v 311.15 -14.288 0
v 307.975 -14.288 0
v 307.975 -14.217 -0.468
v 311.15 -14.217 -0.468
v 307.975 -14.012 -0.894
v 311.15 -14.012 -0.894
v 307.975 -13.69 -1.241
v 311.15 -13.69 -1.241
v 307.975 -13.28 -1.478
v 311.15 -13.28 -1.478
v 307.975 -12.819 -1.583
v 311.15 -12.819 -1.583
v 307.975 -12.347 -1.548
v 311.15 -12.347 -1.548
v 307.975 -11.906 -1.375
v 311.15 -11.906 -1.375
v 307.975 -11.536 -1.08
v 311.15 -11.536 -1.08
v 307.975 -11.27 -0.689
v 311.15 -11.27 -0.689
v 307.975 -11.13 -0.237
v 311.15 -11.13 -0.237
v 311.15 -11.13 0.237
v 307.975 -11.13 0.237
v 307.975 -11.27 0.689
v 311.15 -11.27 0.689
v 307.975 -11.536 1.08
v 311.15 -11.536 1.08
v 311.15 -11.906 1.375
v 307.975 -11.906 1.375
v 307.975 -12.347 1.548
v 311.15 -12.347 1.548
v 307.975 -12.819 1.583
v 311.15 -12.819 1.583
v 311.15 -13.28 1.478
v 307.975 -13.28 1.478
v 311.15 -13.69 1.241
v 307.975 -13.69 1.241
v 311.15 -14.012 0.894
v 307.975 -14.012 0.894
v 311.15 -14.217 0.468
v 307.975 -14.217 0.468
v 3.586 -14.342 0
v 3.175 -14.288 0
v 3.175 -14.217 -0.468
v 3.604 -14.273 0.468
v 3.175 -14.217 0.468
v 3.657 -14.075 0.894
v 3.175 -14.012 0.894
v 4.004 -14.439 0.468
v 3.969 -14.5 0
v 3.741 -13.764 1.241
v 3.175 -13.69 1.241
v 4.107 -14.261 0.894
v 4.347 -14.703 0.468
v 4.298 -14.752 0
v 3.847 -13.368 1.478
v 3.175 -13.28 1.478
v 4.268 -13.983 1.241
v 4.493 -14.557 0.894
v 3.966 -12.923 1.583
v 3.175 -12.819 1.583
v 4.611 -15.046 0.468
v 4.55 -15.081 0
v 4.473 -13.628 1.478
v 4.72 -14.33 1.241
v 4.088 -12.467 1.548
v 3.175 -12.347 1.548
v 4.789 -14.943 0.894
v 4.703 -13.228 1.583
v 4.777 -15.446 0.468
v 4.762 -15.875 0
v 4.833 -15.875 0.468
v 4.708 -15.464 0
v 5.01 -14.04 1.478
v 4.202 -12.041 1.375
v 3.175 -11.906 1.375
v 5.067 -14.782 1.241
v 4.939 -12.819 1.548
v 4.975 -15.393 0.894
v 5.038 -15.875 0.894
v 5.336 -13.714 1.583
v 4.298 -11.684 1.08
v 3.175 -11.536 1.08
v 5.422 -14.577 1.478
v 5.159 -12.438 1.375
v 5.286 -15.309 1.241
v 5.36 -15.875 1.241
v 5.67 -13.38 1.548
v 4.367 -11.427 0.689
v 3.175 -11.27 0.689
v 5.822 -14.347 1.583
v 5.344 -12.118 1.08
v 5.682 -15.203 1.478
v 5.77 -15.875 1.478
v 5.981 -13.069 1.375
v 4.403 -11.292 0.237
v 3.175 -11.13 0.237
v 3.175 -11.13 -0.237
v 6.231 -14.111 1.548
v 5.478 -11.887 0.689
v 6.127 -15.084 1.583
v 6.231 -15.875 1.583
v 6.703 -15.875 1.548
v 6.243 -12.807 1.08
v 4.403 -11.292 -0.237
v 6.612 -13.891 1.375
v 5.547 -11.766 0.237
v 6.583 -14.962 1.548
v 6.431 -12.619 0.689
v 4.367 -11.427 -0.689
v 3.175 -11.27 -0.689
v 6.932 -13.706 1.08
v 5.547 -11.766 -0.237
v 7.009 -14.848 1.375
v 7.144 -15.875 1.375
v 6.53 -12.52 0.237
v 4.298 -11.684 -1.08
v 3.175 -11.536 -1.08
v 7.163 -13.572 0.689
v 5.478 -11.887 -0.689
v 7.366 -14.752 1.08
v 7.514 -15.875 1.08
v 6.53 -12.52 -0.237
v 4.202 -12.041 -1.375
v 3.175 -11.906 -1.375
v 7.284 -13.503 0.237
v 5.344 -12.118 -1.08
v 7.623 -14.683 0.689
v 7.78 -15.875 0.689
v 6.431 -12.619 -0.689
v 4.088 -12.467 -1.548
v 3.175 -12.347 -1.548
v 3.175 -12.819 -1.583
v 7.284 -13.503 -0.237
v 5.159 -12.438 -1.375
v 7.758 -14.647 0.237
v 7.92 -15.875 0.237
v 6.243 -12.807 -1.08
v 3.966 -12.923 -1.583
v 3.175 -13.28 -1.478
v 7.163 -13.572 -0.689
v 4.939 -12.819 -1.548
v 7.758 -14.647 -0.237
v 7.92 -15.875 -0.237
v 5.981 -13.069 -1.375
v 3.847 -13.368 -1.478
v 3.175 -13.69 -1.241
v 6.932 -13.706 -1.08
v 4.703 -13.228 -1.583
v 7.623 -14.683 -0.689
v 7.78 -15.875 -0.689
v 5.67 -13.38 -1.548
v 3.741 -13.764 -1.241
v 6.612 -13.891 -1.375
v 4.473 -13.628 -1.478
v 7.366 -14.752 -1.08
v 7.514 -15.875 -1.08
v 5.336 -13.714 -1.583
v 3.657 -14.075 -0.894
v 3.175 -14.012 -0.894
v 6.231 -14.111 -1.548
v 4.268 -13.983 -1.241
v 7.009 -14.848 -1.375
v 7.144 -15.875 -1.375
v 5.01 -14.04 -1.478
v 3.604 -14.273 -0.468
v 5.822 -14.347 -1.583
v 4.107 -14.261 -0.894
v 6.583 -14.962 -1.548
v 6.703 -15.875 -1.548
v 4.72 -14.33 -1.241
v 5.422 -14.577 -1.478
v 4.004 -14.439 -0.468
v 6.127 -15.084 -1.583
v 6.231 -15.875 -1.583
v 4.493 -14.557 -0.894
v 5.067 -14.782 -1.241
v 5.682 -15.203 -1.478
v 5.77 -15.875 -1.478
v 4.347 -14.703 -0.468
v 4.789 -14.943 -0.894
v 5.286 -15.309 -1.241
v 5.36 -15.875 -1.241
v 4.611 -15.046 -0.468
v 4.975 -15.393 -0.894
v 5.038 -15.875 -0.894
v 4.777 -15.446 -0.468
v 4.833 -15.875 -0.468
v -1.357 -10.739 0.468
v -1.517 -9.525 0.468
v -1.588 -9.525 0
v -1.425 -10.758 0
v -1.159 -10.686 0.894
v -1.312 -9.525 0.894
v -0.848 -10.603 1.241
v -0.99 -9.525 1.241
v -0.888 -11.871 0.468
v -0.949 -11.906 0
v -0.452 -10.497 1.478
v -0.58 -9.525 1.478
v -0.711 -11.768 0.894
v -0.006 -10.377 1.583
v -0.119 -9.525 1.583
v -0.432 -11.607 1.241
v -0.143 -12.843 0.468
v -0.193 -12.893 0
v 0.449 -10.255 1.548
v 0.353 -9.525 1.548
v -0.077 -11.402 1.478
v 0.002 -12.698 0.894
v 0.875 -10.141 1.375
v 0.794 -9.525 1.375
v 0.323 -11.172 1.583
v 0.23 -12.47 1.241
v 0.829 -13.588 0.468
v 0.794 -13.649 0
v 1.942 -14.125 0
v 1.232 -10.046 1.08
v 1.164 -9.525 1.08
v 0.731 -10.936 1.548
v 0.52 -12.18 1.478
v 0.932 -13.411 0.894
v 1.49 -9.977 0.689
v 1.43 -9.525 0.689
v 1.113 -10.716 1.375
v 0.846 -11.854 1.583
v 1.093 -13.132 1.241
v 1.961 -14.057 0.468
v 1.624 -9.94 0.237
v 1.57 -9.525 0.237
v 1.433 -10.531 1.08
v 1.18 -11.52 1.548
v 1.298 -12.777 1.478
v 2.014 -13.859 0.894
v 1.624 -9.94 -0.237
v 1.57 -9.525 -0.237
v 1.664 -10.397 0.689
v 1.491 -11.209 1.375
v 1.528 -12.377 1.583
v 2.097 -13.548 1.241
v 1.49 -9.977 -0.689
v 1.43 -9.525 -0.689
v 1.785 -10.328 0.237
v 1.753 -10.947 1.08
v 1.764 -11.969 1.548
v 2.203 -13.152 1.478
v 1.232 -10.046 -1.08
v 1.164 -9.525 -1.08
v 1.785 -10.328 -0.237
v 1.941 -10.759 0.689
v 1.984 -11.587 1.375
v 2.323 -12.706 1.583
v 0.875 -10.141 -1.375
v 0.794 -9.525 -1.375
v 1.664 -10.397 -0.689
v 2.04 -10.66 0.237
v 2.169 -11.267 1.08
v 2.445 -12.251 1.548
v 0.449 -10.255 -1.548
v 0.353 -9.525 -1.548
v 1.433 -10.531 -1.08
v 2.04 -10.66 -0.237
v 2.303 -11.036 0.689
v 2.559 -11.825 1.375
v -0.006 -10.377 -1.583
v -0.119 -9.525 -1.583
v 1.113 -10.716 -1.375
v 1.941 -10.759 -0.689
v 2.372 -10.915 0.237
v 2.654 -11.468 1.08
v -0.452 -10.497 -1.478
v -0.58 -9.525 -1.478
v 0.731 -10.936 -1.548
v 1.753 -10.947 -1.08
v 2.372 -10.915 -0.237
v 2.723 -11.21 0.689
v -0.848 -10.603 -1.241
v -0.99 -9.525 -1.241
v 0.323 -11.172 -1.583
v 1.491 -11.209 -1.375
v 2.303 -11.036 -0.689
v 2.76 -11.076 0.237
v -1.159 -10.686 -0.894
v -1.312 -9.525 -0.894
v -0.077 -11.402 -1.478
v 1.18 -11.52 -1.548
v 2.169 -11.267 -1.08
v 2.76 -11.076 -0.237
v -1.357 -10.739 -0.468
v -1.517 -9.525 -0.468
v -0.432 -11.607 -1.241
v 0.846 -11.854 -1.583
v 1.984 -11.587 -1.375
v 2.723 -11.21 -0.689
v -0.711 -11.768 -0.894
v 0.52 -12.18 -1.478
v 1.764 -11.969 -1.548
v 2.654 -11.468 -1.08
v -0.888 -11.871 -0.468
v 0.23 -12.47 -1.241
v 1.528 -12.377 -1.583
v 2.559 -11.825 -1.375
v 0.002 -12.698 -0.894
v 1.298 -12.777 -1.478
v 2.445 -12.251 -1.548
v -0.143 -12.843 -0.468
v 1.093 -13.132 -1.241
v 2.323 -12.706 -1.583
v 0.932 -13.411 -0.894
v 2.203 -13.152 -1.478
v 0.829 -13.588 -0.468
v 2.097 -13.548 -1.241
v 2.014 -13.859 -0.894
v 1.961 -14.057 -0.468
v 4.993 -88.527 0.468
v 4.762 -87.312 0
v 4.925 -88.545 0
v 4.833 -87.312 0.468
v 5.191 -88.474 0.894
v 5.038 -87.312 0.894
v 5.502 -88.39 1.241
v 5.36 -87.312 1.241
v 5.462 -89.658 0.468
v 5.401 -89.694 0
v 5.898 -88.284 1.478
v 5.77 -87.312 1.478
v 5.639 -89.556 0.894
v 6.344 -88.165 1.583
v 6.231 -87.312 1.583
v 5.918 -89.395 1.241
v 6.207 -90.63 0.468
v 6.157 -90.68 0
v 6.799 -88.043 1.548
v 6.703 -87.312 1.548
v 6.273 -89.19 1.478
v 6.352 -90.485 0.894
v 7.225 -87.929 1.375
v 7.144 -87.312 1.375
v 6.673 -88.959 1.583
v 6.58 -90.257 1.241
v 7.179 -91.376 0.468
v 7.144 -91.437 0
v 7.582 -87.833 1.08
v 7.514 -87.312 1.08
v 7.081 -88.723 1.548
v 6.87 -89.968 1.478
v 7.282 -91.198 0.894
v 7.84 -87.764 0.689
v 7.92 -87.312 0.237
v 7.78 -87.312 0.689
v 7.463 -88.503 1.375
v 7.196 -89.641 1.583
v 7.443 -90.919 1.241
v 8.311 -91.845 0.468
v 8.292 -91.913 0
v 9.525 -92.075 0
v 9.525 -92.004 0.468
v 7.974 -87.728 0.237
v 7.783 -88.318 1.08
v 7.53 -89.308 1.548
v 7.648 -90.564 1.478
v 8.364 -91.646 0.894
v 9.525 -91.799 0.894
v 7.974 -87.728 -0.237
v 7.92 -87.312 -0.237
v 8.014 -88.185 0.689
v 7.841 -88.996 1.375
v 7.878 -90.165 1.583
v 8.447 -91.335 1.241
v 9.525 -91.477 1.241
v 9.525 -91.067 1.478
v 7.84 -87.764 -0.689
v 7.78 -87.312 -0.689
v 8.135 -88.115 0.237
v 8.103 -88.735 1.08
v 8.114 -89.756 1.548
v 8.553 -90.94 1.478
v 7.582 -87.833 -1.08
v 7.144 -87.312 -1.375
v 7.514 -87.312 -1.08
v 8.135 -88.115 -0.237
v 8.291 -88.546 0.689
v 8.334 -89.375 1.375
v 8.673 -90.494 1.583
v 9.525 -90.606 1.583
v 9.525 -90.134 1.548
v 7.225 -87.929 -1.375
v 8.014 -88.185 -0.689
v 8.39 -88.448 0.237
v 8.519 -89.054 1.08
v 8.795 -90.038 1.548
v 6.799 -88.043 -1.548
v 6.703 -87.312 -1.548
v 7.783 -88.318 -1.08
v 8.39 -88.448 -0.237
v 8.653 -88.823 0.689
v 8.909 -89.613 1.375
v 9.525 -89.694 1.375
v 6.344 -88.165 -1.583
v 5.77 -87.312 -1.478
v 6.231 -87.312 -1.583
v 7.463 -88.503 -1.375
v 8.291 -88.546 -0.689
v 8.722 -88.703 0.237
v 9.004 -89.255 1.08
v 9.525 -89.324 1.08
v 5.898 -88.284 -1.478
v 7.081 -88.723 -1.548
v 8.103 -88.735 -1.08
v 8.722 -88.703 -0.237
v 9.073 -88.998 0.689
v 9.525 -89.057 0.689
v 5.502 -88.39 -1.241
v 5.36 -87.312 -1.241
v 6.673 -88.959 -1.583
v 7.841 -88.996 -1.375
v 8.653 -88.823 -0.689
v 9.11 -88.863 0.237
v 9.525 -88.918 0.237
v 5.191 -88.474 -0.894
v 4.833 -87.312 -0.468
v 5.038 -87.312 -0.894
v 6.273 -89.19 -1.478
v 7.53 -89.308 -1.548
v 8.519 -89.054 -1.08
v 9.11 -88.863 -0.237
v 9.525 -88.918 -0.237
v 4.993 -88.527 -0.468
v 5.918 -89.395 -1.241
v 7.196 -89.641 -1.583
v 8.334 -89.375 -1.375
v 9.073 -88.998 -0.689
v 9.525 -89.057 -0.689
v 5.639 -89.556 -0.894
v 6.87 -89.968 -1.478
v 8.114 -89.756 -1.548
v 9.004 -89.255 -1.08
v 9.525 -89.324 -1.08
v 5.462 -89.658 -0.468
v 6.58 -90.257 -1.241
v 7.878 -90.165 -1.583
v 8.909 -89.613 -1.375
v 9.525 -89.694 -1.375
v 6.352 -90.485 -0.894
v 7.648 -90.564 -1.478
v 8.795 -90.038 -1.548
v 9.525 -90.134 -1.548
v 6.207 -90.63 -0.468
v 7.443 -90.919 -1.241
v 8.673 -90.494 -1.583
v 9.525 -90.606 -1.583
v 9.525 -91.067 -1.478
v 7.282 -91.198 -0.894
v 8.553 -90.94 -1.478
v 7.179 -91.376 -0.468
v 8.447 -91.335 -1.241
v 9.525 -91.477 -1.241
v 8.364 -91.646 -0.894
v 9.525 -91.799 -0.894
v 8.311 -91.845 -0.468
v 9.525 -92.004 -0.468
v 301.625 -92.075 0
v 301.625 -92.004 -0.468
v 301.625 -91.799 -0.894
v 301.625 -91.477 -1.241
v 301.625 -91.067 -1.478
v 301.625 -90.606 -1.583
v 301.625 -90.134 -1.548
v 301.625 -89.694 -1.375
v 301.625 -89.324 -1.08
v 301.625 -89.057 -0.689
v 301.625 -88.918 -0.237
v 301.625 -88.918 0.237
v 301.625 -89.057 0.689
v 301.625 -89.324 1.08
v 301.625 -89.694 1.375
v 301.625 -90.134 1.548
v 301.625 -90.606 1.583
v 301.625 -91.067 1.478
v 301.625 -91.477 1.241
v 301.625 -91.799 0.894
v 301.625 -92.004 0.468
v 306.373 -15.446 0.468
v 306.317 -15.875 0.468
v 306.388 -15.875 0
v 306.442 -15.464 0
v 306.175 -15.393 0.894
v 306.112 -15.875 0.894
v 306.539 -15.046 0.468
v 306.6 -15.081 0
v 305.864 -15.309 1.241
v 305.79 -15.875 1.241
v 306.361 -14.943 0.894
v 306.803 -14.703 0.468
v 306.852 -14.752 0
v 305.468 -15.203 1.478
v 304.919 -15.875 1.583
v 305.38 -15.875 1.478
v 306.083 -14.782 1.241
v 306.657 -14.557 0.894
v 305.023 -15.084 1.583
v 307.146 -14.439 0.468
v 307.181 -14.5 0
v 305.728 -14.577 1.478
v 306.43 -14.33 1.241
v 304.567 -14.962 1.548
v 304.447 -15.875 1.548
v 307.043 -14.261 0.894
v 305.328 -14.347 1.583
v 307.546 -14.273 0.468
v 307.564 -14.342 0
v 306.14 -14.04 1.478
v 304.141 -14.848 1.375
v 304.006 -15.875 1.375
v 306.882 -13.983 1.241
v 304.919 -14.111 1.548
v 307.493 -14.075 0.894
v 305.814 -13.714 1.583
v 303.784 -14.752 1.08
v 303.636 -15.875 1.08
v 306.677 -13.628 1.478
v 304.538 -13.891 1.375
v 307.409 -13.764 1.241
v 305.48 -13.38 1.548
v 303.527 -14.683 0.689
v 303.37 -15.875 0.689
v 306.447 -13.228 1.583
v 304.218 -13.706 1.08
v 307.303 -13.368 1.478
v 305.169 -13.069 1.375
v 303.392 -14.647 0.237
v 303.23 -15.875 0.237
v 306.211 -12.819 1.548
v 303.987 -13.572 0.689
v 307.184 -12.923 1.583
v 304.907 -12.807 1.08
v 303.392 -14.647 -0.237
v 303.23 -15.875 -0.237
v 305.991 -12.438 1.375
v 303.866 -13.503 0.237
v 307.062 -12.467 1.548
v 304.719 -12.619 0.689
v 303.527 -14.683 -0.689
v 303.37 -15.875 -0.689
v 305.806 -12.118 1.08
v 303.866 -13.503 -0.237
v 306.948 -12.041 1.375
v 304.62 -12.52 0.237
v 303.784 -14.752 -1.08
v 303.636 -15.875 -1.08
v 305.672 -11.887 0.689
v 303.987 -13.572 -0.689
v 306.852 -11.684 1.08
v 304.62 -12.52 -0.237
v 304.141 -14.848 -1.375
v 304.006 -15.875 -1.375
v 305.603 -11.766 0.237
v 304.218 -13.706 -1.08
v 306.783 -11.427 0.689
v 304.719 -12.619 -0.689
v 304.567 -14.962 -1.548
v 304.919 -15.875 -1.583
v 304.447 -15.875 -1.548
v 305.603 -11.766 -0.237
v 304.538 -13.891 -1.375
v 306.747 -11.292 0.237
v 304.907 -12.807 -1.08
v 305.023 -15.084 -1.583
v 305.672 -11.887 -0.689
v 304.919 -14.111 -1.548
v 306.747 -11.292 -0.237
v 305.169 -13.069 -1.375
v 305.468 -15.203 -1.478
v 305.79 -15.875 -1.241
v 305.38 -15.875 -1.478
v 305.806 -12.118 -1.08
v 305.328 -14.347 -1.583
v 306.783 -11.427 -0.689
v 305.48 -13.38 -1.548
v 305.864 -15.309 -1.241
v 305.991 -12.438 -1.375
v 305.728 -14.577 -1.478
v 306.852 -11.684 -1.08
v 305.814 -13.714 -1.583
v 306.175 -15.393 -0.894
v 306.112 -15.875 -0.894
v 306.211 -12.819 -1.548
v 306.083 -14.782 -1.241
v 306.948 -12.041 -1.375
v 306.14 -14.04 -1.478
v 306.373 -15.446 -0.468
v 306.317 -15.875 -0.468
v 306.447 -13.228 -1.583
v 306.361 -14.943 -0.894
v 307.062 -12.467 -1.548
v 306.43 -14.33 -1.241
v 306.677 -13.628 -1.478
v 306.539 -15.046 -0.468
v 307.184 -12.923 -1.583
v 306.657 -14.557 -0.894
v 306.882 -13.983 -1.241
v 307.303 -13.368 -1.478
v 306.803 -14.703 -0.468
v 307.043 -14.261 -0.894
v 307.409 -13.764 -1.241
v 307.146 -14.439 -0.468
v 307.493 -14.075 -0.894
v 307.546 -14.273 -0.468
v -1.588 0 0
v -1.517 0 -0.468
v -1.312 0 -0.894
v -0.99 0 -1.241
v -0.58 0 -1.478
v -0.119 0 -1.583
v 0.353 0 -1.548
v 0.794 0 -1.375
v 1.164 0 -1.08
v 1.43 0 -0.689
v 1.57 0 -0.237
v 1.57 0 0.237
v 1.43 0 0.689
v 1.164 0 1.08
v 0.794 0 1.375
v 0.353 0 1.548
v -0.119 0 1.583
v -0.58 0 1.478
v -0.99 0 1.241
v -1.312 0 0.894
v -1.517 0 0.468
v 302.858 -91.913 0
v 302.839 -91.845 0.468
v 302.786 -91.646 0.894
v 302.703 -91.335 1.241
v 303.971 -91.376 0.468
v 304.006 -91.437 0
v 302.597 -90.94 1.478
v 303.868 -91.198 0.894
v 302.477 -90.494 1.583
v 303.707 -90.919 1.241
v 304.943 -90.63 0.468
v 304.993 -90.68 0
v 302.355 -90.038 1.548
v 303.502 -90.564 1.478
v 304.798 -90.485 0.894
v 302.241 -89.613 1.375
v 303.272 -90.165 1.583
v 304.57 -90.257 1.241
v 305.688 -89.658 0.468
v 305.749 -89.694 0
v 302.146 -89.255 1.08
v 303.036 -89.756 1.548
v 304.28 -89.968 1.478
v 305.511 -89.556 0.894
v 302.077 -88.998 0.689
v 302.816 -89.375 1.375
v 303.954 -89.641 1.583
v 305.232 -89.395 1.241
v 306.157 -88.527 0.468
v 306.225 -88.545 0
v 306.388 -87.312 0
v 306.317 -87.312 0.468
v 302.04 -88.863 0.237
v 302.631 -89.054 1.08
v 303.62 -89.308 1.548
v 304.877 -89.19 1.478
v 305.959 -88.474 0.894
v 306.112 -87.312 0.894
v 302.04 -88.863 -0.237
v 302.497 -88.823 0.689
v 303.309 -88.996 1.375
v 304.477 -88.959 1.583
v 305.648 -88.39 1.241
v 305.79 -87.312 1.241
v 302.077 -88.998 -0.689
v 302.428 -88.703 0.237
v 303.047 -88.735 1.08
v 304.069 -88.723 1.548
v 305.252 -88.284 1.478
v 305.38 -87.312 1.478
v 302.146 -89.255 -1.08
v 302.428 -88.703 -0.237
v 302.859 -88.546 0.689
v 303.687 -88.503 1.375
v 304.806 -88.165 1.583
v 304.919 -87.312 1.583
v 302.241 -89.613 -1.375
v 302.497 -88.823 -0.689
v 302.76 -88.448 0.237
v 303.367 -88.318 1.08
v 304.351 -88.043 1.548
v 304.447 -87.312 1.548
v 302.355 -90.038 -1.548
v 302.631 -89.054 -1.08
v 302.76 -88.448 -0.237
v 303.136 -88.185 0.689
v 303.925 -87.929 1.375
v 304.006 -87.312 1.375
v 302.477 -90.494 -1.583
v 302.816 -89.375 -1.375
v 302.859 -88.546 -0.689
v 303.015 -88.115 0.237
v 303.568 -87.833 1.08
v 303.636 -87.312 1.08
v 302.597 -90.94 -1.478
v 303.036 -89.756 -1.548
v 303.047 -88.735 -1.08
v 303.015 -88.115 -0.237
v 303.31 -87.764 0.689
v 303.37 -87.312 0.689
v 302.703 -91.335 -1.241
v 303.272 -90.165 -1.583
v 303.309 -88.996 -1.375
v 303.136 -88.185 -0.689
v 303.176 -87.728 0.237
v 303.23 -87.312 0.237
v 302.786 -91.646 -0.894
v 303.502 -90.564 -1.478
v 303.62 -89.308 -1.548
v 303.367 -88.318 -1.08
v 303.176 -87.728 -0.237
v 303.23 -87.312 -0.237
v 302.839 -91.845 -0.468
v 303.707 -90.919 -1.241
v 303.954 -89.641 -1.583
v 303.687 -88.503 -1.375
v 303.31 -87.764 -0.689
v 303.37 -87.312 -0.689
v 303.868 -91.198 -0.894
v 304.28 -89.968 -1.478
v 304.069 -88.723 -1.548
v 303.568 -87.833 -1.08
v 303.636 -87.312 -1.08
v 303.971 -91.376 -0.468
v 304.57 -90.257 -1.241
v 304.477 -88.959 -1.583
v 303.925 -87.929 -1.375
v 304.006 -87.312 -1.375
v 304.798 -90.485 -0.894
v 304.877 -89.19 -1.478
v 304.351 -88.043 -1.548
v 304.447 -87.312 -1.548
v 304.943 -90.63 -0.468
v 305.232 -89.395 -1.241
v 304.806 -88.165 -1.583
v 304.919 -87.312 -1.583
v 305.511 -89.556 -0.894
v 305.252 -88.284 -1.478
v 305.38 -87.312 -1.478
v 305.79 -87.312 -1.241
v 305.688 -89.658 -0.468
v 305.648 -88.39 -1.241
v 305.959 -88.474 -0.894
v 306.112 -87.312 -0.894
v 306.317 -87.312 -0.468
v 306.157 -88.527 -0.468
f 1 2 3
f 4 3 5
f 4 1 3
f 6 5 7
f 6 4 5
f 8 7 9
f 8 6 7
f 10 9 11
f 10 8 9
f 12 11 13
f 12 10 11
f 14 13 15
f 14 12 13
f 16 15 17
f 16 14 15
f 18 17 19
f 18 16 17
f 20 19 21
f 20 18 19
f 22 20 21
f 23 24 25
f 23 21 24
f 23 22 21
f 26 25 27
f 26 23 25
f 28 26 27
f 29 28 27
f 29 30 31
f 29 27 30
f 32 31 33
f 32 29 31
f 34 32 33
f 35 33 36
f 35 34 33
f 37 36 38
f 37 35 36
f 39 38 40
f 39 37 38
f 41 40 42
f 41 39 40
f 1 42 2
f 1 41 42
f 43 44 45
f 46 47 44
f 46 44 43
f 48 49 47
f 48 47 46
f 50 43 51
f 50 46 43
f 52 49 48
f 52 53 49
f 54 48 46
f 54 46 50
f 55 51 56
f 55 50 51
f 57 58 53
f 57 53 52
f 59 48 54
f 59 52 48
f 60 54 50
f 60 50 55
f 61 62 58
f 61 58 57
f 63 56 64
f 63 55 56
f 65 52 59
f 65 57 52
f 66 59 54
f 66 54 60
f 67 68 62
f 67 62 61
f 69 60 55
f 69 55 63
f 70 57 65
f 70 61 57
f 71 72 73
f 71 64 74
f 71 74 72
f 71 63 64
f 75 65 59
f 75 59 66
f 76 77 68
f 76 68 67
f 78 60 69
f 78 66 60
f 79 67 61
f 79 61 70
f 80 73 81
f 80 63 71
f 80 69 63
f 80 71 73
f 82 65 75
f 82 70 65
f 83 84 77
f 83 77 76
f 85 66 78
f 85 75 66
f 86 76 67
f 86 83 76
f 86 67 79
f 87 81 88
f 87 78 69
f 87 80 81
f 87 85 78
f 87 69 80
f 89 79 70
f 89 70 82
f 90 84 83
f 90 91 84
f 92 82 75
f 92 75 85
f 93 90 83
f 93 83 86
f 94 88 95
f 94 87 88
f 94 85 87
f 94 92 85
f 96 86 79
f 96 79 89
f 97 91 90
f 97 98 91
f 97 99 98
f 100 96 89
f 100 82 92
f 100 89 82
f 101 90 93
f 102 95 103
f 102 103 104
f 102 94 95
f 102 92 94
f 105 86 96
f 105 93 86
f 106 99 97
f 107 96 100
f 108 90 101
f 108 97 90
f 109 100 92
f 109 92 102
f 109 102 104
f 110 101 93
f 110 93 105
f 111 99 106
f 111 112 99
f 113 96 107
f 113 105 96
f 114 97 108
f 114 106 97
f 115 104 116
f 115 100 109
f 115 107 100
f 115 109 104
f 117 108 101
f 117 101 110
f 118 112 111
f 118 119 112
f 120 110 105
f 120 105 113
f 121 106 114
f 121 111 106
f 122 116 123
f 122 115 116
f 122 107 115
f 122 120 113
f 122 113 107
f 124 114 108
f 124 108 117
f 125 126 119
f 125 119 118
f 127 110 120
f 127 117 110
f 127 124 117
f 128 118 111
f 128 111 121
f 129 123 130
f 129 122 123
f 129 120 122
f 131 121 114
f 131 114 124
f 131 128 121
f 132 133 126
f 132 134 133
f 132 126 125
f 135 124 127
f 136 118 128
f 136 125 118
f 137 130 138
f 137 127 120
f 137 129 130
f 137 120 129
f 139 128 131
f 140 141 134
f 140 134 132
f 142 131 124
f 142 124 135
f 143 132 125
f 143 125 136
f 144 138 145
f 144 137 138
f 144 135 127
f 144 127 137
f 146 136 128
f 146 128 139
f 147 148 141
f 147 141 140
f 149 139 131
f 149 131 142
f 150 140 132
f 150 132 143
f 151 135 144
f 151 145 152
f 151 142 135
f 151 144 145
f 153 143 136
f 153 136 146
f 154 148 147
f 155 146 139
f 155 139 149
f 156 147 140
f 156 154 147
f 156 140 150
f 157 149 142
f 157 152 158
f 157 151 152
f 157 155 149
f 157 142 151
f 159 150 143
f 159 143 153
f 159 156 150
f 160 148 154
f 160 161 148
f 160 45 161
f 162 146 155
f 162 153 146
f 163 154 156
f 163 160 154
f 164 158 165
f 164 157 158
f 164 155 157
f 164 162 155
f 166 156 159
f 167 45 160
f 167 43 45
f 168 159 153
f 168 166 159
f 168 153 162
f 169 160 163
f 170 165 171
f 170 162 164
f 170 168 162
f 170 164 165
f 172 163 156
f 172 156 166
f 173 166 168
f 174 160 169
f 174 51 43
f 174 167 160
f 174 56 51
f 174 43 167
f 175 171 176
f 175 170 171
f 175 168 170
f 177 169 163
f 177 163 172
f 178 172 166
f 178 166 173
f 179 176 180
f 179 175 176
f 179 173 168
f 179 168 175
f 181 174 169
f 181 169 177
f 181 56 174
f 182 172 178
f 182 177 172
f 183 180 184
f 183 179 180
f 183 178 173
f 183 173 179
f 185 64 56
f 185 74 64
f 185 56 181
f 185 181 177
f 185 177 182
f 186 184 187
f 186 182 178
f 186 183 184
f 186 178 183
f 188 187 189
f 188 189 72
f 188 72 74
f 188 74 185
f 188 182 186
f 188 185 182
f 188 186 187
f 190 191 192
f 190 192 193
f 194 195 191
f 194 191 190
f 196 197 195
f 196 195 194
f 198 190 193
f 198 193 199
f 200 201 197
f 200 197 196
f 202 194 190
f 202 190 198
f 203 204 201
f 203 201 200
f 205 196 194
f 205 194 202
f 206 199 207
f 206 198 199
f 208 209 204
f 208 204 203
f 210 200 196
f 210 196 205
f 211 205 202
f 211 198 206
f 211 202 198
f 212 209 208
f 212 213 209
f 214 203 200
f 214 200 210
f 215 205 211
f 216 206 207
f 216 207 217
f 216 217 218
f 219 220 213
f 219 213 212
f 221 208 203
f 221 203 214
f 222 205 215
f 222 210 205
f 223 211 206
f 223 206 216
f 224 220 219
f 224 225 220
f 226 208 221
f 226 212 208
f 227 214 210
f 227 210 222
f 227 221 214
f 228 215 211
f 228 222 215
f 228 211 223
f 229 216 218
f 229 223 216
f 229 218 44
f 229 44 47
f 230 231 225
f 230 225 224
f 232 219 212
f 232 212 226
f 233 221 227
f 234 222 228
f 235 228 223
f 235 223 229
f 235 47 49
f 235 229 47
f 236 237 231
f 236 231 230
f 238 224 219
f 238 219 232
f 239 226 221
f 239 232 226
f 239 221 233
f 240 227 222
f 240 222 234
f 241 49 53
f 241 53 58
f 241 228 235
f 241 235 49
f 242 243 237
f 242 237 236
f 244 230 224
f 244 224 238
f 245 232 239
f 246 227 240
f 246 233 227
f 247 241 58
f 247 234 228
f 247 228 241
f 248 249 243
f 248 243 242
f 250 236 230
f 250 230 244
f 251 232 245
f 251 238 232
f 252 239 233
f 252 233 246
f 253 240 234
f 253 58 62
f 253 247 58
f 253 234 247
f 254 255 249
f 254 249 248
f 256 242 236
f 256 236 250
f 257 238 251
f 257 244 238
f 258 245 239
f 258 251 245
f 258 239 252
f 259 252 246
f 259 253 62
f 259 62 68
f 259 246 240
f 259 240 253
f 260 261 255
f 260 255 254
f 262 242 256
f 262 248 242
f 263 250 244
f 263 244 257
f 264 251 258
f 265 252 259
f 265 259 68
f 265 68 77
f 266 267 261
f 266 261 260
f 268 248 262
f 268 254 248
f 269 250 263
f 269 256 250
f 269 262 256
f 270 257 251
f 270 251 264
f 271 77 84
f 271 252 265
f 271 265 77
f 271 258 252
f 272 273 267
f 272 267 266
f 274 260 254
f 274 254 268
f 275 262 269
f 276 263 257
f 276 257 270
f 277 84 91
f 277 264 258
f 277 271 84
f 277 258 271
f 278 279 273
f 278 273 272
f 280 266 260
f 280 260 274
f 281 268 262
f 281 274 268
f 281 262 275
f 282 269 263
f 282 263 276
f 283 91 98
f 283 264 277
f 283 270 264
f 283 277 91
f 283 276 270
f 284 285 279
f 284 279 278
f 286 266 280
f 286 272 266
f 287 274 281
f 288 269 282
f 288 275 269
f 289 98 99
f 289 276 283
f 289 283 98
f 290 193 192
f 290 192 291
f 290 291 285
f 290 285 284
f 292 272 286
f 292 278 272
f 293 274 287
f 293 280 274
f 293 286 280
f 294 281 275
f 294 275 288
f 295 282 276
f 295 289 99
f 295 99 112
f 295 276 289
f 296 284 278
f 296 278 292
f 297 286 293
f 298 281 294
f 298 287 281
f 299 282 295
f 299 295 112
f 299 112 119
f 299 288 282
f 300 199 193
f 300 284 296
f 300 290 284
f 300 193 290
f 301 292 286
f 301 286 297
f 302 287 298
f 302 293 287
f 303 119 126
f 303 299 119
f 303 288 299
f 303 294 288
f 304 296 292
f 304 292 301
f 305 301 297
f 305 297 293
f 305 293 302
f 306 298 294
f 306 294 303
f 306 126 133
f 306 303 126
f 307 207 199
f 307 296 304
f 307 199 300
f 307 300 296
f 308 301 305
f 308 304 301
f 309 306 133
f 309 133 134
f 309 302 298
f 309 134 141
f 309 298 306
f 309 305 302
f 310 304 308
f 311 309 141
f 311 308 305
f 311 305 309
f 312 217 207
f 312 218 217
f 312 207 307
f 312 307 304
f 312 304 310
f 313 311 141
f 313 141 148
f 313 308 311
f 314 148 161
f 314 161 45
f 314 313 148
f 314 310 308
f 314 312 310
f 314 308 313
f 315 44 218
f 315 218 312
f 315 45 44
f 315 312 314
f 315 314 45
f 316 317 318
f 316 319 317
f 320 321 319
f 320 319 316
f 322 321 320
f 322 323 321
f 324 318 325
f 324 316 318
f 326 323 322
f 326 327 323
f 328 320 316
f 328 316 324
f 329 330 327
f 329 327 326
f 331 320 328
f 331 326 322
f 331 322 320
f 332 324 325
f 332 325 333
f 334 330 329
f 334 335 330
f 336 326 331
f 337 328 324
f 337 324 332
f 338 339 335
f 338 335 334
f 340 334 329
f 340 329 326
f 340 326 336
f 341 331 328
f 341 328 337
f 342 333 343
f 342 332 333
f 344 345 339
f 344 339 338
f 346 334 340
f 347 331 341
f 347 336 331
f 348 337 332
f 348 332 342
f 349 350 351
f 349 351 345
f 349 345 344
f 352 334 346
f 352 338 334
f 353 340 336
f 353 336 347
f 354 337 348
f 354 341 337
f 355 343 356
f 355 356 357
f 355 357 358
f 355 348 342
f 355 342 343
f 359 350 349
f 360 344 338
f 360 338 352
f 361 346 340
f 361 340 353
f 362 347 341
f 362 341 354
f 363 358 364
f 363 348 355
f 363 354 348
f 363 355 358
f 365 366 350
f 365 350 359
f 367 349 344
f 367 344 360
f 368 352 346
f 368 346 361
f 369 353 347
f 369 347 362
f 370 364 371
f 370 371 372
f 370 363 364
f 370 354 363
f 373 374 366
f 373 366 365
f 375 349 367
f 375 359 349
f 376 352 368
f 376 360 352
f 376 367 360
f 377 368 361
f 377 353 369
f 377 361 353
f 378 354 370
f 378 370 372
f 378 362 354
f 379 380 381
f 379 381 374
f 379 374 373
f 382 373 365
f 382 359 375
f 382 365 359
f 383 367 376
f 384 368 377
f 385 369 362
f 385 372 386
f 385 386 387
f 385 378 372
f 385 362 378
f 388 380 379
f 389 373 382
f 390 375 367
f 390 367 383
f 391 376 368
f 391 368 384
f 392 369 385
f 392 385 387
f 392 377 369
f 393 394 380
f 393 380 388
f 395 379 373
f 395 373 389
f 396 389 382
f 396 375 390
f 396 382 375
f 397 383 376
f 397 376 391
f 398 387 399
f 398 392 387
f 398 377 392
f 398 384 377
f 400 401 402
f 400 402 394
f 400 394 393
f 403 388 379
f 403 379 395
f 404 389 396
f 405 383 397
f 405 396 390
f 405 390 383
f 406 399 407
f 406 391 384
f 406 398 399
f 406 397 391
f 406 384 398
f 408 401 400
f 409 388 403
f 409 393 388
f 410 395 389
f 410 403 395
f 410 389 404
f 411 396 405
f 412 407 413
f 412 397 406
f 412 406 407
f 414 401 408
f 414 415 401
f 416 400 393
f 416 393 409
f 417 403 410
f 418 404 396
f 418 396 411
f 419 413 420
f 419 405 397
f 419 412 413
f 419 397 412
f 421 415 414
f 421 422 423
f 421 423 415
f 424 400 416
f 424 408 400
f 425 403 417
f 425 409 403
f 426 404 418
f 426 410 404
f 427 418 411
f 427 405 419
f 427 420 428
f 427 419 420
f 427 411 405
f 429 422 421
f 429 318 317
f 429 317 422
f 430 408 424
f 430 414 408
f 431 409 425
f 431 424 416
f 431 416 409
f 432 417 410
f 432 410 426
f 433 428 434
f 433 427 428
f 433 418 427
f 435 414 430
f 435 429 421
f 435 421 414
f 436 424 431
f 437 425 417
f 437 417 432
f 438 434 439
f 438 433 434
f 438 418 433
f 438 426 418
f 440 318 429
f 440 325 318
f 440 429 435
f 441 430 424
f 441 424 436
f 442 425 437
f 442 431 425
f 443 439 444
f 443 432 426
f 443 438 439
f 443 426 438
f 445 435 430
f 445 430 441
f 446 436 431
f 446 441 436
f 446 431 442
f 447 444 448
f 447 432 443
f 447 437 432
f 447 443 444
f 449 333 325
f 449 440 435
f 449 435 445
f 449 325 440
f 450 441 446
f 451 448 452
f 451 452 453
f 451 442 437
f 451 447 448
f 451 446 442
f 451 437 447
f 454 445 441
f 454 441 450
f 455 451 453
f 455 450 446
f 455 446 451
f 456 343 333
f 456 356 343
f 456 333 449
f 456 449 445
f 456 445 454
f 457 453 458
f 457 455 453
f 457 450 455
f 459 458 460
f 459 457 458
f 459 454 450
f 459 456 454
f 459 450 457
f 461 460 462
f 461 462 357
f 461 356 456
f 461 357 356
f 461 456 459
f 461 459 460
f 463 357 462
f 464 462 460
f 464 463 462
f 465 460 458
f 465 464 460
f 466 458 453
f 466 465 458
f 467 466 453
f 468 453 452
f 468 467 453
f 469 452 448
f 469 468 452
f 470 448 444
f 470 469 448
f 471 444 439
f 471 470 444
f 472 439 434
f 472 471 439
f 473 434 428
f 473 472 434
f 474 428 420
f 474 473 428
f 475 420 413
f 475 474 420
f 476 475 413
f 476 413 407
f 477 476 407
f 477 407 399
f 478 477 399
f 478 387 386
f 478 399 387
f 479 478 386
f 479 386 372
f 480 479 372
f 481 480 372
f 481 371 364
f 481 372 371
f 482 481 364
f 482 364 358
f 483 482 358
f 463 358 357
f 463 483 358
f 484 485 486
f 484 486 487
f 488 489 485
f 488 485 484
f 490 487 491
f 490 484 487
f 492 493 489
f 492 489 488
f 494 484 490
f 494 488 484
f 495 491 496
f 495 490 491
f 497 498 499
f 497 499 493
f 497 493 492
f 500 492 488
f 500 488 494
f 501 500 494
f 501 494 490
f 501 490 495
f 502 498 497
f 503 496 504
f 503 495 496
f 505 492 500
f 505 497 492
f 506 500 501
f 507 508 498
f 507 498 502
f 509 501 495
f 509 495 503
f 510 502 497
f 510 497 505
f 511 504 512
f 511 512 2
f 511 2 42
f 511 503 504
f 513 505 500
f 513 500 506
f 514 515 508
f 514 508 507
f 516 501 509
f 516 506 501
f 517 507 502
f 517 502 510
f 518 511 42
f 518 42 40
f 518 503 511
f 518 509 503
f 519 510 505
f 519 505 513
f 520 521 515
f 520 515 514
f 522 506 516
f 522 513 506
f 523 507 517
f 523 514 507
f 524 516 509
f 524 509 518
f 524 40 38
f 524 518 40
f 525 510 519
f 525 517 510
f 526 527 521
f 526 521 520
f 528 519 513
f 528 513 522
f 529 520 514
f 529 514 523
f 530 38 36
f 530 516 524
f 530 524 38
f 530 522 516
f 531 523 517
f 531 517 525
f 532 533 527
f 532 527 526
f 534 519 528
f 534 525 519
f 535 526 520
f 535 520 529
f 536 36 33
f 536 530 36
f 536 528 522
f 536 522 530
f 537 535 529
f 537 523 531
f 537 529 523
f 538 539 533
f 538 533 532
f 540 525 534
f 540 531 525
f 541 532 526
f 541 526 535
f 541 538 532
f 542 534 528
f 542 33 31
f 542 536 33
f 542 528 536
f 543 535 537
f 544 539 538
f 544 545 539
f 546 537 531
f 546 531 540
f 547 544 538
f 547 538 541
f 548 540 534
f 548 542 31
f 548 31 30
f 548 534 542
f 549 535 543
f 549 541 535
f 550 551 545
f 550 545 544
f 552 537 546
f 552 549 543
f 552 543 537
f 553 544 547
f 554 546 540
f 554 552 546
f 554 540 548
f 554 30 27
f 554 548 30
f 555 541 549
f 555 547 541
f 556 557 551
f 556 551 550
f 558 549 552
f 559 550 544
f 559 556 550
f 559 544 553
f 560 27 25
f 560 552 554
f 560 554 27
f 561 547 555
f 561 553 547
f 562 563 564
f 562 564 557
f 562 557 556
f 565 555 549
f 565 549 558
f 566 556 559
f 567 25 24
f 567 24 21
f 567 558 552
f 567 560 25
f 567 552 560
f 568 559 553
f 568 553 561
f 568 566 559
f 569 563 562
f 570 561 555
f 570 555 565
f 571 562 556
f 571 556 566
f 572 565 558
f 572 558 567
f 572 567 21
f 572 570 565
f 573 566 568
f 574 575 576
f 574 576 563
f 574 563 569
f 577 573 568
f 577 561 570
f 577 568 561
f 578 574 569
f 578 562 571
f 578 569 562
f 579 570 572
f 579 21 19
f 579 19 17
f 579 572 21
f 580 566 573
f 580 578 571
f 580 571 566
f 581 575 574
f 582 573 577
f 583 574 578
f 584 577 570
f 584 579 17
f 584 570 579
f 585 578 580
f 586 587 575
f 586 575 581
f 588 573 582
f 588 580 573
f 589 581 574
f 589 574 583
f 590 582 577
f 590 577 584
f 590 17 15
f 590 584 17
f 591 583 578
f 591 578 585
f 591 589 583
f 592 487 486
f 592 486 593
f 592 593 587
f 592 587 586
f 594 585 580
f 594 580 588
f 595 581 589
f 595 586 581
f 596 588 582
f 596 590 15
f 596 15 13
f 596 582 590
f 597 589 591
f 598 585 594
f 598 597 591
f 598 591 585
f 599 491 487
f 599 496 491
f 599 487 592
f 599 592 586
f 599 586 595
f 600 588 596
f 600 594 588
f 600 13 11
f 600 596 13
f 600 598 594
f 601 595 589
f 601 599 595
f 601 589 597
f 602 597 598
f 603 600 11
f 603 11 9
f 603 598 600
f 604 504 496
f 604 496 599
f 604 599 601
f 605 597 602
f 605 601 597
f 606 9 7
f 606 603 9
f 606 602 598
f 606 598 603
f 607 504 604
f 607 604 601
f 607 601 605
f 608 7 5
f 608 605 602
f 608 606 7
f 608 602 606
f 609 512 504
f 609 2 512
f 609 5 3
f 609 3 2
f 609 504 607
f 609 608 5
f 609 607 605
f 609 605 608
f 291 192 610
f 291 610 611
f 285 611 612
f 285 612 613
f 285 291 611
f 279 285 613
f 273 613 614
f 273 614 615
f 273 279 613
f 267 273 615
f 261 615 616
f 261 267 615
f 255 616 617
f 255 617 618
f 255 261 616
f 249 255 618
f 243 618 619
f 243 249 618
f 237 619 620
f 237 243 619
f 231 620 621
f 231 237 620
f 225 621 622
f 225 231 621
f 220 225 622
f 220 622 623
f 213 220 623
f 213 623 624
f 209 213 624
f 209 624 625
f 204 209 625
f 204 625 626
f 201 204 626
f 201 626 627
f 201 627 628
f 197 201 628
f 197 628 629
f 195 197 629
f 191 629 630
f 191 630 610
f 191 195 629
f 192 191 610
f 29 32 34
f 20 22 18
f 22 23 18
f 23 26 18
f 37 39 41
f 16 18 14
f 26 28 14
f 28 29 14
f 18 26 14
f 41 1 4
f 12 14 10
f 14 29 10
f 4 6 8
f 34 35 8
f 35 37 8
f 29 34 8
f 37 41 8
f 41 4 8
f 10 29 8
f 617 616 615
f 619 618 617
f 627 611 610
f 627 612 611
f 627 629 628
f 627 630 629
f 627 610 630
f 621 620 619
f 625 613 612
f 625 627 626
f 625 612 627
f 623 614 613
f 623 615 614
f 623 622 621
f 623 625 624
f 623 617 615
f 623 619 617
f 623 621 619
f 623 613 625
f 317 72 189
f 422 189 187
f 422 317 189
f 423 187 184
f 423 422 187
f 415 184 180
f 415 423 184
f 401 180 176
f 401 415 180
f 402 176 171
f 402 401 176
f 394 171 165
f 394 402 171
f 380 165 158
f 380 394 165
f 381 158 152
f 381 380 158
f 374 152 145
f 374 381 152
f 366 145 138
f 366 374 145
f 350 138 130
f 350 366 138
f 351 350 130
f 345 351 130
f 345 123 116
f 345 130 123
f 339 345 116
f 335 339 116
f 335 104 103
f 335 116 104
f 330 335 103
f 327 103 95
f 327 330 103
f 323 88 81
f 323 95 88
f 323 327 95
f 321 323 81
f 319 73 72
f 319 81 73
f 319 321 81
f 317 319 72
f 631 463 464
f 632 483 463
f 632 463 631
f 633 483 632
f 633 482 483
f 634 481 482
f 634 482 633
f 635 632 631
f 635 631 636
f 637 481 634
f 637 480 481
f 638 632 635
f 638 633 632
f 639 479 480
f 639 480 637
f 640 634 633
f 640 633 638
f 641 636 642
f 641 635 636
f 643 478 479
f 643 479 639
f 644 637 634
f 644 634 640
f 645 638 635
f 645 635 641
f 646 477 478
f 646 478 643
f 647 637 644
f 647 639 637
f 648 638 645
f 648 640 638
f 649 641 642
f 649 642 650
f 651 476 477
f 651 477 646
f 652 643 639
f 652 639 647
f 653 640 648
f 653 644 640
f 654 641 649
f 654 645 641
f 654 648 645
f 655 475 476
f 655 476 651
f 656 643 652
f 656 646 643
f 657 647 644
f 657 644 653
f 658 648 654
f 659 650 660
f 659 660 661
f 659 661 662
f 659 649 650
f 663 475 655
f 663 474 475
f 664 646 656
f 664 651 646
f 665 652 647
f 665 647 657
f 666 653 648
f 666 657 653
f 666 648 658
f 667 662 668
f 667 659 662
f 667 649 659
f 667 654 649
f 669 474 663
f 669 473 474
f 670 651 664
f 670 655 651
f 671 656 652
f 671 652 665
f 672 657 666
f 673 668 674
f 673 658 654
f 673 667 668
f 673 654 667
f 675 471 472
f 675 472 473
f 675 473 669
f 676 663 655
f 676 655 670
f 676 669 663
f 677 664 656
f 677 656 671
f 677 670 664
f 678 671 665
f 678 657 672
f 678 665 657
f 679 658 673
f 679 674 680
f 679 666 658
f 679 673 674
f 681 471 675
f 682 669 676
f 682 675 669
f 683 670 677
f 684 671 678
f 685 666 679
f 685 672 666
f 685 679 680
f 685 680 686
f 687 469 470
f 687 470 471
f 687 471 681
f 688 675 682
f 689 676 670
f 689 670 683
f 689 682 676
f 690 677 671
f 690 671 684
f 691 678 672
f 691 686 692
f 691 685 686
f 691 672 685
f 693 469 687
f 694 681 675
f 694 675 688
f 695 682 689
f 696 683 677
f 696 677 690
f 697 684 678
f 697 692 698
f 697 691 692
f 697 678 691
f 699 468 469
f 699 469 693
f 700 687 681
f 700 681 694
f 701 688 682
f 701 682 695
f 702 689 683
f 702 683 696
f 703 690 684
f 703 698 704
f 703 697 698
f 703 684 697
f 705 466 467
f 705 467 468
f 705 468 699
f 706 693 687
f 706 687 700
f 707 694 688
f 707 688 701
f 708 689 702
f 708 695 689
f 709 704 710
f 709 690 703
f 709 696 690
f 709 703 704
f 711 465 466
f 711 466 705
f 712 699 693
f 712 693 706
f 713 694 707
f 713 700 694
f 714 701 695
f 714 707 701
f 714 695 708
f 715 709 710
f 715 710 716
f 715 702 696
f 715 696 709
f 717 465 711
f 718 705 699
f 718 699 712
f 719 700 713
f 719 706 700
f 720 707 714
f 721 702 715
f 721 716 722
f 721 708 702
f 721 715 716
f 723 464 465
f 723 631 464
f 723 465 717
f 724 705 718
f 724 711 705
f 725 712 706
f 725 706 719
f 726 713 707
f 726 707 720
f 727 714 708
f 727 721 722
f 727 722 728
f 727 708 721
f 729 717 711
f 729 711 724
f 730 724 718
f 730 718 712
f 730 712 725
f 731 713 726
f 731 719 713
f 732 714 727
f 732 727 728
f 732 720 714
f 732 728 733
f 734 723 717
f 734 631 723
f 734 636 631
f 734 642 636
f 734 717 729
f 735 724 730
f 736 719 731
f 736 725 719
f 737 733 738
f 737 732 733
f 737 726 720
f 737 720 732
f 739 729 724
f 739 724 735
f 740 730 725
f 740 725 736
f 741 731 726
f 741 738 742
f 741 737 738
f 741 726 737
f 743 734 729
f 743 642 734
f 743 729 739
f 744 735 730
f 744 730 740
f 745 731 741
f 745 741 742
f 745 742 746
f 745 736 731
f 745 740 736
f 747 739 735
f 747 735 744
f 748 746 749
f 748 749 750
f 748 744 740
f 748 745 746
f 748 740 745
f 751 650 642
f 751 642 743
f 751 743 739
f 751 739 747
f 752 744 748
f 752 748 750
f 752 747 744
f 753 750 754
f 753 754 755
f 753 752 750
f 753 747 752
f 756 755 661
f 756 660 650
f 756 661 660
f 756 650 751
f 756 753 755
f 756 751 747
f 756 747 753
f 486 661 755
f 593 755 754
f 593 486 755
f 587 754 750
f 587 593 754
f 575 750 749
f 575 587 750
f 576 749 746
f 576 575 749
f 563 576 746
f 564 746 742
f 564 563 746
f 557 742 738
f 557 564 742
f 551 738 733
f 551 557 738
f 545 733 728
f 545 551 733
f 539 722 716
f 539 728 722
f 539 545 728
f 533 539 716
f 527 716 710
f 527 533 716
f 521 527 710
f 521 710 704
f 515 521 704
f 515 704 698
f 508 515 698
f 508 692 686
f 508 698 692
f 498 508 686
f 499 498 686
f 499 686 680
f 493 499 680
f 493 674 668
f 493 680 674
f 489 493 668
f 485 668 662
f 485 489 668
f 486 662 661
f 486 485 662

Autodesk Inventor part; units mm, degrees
ref_plane "YZ Plane" through (0, 0, 0) normal (1, 0, 0) x (0, 1, 0)
ref_plane "XZ Plane" through (0, 0, 0) normal (0, 1, 0) x (-1, 0, 0)
ref_plane "XY Plane" through (0, 0, 0) normal (0, 0, 1) x (1, 0, 0)
sketch "Sketch1" plane through (0, 0, 0) normal (0, 1, 0) x (-1, 0, 0)
  circle A0 centre (0, 0) radius 1.5875
  dimension "d0" = 3.175
sketch "Sketch2" plane through (0, 0, 0) normal (0, 0, 1) x (1, 0, 0)
  line L0 (0, 0) -> (0, -9.525)
  line L1 (3.175, -12.7) -> (3.175, -12.7)
  line L2 (6.35, -15.875) -> (6.35, -87.3125)
  line L3 (9.525, -90.4875) -> (301.625, -90.4875)
  line L4 (304.8, -87.3125) -> (304.8, -15.875)
  line L5 (307.975, -12.7) -> (311.15, -12.7)
  arc A0 (6.35, -15.875) -> (3.175, -12.7) centre (3.175, -15.875) ccw
  arc A1 (0, -9.525) -> (3.175, -12.7) centre (3.175, -9.525) ccw
  arc A2 (6.35, -87.3125) -> (9.525, -90.4875) centre (9.525, -87.3125) ccw
  arc A3 (301.625, -90.4875) -> (304.8, -87.3125) centre (301.625, -87.3125) ccw
  arc A4 (307.975, -12.7) -> (304.8, -15.875) centre (307.975, -15.875) ccw
  point P0 (0, -12.7)
  point P1 (6.35, -12.7)
  point P2 (6.35, -90.4875)
  point P3 (304.8, -90.4875)
  point P4 (304.8, -12.7)
  dimension "d1" = 12.7
  dimension "d2" = 6.35
  dimension "d3" = 77.7875
  dimension "d4" = 298.45
  dimension "d5" = 6.35
  dimension "d6" = 90
  dimension "d7" = 3.175
sweep "Sweep1" add profiles "Sketch1" path "Sketch2"
properties part number "wirePusher"
